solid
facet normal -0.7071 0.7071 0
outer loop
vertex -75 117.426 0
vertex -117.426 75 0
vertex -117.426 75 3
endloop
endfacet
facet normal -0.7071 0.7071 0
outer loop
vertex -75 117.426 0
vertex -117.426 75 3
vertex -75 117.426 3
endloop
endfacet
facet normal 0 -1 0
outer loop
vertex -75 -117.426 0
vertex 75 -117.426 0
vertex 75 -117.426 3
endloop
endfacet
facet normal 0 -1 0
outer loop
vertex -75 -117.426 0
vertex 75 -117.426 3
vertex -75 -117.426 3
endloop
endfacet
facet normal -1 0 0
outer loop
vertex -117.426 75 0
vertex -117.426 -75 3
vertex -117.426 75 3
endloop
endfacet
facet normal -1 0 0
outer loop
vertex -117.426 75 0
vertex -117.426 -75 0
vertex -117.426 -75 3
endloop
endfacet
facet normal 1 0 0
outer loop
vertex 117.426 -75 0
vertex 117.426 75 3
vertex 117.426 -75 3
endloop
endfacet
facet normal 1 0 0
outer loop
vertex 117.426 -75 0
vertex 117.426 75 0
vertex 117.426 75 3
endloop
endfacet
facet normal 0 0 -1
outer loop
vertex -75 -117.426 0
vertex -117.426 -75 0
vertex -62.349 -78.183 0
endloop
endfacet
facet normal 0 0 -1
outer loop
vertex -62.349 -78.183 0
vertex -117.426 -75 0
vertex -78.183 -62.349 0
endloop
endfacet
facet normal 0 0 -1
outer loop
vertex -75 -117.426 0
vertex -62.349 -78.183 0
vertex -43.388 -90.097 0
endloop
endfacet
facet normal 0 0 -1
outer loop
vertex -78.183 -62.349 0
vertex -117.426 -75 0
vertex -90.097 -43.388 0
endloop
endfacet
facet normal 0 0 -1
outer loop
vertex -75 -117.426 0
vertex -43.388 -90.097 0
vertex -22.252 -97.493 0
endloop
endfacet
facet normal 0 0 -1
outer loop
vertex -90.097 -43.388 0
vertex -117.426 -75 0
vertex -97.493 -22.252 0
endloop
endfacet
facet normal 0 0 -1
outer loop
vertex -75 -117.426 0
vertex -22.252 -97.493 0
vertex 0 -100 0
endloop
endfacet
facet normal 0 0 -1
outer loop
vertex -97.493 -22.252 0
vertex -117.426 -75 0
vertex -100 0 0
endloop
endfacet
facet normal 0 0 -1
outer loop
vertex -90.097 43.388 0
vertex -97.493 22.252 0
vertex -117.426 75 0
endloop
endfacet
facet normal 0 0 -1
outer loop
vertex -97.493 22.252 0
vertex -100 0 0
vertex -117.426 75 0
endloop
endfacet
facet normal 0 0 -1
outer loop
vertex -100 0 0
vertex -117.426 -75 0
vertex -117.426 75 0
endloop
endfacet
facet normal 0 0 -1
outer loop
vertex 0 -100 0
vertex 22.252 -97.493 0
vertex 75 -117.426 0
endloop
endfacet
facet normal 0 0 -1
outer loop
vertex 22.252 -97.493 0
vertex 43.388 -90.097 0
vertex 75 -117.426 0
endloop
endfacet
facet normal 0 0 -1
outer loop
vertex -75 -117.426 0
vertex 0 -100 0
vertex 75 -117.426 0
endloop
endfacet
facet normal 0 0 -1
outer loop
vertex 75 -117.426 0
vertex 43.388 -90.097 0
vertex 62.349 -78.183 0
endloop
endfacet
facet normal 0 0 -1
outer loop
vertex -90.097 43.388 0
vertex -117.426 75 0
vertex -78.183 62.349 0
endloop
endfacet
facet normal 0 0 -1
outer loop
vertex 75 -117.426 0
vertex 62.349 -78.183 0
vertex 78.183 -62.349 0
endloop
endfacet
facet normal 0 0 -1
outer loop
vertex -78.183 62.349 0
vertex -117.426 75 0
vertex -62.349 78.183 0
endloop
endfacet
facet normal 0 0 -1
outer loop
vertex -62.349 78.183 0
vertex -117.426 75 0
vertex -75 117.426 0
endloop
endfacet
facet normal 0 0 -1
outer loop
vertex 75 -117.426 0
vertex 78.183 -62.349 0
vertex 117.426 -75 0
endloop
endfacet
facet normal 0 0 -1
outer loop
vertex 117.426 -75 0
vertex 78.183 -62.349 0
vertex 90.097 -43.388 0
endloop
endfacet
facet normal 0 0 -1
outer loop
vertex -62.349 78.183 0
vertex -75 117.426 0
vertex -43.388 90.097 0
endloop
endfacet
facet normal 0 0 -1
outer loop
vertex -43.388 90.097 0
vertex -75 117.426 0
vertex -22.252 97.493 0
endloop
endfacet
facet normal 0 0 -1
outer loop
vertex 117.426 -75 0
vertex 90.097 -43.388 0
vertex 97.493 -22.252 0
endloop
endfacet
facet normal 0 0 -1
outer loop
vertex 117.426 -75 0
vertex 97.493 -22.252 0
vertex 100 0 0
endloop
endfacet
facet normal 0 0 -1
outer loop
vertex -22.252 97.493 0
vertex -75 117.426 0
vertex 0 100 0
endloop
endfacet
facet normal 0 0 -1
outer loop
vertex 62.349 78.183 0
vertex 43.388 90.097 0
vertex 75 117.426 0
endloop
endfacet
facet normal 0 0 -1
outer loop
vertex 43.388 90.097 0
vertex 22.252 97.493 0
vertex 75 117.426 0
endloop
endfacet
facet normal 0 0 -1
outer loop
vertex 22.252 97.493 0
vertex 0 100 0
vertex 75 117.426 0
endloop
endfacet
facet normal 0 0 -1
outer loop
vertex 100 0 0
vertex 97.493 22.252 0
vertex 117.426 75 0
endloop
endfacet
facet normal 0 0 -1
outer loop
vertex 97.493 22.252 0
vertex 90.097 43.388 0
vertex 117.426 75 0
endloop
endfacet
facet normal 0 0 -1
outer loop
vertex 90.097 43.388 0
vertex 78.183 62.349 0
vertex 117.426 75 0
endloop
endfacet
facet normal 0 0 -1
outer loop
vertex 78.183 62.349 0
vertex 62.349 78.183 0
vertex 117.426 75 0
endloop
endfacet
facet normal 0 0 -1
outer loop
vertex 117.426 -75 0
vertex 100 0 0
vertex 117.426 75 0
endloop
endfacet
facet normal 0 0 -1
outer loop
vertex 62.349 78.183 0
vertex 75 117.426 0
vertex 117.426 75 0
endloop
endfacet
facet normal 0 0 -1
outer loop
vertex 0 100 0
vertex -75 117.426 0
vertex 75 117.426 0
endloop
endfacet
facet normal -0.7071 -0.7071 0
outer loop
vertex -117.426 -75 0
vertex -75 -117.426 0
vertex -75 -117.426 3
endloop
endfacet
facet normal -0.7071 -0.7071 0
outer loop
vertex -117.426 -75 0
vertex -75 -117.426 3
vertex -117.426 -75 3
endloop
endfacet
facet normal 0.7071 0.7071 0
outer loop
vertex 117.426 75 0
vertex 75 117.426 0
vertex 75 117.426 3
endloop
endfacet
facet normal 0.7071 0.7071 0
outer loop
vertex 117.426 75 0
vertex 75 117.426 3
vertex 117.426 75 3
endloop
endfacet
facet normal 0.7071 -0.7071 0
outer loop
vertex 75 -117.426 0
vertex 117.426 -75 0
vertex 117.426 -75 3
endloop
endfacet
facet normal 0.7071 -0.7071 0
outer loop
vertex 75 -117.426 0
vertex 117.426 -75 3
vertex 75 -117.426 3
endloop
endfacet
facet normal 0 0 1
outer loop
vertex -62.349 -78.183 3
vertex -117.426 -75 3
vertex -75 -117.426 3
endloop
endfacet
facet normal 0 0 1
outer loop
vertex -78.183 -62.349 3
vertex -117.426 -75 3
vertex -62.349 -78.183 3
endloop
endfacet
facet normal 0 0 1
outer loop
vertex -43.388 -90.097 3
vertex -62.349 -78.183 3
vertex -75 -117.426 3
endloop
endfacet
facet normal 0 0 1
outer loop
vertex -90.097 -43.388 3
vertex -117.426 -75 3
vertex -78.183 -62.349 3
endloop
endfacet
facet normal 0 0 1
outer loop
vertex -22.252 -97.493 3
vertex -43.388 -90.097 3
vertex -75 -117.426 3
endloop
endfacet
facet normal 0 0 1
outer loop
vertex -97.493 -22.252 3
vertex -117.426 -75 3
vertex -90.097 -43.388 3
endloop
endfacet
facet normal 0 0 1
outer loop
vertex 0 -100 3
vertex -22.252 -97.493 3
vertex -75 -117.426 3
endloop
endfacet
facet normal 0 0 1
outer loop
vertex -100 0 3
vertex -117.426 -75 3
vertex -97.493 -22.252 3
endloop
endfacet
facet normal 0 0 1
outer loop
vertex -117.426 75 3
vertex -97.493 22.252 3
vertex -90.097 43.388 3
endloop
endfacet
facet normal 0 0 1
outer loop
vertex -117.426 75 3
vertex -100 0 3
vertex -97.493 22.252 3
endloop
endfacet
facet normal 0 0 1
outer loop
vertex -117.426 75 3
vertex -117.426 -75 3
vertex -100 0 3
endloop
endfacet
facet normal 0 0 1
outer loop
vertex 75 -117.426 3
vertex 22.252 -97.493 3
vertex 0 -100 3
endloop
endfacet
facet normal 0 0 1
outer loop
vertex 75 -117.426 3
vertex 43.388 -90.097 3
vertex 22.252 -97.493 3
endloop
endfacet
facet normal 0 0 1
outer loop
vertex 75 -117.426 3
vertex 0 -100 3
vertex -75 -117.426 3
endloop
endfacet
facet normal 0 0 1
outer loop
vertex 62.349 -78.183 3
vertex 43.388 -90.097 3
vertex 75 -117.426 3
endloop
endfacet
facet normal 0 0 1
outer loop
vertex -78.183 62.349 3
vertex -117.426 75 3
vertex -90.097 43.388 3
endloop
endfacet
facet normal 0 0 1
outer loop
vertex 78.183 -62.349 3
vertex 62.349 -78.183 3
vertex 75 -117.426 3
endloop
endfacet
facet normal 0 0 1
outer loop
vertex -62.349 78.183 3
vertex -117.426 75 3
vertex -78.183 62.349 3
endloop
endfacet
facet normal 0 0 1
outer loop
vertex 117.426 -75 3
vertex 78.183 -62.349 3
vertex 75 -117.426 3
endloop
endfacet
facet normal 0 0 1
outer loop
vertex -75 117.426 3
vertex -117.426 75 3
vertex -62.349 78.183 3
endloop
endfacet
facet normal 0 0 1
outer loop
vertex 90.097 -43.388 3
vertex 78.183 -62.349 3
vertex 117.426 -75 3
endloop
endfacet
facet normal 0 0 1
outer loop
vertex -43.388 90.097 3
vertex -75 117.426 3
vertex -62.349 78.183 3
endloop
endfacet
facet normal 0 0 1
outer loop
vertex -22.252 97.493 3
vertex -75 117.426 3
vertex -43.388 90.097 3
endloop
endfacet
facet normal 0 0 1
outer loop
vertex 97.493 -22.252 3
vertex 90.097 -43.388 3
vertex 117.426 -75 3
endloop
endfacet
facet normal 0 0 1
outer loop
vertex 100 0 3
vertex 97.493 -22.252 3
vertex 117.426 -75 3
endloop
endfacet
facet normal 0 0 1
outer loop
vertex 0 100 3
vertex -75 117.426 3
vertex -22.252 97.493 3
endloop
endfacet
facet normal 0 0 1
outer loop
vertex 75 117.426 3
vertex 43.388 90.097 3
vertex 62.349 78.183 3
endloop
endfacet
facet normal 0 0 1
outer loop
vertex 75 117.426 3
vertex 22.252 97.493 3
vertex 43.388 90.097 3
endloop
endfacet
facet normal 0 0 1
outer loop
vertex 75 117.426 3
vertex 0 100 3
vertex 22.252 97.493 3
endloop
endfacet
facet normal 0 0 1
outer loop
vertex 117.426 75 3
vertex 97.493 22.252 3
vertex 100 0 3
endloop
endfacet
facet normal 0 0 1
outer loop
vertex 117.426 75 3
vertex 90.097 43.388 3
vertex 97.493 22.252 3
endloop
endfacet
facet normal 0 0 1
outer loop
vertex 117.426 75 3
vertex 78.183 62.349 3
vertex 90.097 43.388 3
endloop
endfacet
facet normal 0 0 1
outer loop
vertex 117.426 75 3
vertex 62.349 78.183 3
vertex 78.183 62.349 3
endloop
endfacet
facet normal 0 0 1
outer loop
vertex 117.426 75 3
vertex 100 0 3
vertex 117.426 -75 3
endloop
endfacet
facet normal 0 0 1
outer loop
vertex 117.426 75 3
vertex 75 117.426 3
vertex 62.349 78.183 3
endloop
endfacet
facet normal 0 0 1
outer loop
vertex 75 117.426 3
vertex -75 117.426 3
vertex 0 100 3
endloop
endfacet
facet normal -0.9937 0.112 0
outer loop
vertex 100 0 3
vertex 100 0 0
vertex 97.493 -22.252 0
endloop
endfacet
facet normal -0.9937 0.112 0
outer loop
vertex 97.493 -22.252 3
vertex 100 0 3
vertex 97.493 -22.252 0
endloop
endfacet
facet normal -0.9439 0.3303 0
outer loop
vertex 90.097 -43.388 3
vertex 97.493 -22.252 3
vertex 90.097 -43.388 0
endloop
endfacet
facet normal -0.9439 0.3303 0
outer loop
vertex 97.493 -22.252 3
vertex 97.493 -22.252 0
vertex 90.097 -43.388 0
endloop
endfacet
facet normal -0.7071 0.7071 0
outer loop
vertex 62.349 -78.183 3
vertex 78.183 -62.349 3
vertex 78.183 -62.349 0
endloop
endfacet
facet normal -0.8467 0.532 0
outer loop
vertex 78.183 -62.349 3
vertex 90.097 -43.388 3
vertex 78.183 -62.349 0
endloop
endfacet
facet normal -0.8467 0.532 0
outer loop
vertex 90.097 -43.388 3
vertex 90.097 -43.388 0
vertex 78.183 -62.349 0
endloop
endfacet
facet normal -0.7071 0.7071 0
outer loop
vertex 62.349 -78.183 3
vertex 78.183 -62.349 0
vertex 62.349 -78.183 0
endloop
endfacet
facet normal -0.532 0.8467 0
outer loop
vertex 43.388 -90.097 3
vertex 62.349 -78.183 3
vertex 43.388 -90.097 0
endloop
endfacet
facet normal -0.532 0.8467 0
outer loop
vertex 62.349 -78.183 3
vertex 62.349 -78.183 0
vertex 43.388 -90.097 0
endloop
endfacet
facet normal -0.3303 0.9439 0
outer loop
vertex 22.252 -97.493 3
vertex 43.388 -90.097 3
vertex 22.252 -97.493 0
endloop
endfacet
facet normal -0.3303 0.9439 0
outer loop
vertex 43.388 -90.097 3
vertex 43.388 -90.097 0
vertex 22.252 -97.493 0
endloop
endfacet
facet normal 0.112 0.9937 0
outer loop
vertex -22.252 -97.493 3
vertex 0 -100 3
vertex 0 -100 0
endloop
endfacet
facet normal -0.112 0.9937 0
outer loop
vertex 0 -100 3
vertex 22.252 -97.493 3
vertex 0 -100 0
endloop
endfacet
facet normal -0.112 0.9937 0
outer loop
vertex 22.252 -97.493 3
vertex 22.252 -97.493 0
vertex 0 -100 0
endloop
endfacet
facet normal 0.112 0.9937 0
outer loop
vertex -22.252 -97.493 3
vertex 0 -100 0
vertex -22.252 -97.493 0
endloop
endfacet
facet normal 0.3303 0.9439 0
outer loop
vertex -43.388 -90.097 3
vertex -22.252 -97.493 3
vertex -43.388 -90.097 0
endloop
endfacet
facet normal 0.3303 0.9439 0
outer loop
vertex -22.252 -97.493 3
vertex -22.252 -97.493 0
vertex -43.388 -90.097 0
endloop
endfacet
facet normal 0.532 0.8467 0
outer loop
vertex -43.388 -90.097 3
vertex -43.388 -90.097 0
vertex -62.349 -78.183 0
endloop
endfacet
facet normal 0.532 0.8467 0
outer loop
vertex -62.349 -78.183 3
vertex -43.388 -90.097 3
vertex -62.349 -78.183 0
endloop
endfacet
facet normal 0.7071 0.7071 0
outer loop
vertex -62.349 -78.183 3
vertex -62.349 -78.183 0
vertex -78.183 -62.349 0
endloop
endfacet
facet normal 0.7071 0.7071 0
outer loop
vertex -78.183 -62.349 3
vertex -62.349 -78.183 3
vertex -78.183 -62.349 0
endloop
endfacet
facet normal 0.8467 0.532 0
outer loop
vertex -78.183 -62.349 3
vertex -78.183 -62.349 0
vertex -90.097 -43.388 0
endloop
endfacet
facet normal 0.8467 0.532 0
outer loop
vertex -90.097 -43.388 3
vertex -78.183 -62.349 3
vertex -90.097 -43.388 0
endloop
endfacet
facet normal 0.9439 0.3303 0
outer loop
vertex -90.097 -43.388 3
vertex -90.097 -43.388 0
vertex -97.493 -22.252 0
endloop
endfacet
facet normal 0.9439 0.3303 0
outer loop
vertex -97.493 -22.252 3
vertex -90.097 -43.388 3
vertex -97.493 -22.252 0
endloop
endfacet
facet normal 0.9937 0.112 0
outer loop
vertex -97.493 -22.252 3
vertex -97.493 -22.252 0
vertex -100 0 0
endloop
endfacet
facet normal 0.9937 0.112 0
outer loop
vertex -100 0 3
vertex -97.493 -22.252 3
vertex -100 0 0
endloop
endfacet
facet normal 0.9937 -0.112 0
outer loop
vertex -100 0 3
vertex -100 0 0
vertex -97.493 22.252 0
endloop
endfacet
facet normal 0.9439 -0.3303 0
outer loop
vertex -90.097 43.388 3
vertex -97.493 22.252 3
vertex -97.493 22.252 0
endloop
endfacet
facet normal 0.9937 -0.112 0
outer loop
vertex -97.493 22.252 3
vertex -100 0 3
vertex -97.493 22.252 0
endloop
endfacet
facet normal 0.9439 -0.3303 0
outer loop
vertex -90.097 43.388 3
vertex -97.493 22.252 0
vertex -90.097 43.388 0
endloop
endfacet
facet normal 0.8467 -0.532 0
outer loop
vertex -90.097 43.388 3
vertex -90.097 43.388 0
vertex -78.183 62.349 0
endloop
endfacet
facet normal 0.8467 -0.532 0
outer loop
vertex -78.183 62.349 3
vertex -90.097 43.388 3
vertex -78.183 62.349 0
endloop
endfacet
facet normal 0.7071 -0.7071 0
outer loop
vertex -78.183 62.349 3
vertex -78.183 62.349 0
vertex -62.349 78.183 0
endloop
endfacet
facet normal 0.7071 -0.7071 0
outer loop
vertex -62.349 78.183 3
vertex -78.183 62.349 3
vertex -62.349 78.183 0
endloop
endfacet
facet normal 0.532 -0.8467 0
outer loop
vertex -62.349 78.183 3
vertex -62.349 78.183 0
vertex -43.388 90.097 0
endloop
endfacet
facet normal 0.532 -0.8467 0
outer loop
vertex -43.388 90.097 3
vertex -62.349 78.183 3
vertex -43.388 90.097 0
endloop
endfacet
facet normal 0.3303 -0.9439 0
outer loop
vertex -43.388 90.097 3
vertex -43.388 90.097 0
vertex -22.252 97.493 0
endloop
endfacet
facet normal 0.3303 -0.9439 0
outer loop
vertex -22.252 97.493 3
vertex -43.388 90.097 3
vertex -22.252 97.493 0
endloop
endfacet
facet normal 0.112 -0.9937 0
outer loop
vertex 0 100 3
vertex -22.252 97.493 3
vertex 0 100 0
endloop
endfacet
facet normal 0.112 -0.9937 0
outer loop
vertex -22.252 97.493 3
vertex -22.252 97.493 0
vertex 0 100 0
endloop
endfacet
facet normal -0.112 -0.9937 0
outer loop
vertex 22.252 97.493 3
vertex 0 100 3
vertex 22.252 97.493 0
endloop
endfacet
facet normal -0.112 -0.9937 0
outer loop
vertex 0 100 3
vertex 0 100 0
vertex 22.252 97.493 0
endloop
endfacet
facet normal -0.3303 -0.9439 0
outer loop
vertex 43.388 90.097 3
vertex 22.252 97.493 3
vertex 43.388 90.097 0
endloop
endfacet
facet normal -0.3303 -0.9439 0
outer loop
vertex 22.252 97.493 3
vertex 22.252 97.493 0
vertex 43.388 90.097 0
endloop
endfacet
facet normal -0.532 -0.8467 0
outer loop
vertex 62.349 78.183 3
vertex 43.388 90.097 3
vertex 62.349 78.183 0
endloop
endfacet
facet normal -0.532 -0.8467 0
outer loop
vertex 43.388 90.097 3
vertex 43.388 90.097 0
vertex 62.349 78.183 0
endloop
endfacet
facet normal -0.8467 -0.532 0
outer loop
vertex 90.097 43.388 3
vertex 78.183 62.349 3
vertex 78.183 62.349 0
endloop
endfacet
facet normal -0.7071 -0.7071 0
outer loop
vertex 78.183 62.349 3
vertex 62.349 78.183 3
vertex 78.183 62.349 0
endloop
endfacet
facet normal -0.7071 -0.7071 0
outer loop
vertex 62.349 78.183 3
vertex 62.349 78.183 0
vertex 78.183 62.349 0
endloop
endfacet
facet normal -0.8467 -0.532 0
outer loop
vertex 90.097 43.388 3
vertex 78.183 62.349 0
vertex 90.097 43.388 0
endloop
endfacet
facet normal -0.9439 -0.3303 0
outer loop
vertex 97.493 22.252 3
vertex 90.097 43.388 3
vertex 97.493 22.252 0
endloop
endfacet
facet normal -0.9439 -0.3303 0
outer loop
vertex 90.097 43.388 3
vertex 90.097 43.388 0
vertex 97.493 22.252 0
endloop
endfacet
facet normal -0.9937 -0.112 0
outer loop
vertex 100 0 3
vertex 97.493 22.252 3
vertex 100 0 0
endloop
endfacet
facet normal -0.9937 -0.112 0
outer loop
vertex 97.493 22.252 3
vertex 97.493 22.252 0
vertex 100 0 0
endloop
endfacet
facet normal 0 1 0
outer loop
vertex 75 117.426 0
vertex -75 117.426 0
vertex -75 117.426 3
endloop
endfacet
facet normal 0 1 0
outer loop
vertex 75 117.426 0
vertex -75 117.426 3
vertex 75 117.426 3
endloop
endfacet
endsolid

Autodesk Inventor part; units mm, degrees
ref_plane "YZ Plane" through (0, 0, 0) normal (1, 0, 0) x (0, 1, 0)
ref_plane "XZ Plane" through (0, 0, 0) normal (0, 1, 0) x (-1, 0, 0)
ref_plane "XY Plane" through (0, 0, 0) normal (0, 0, 1) x (1, 0, 0)
sketch "Sketch1" plane through (0, 0, 0) normal (0, 0, 1) x (1, 0, 0)
  circle A0 centre (0, 0) radius 100
  line L0 (-117.4264, -75) -> (-117.4264, 75)
  line L1 (-117.4264, 75) -> (-75, 117.4264)
  line L2 (-75, 117.4264) -> (75, 117.4264)
  line L3 (75, 117.4264) -> (117.4264, 75)
  line L4 (117.4264, 75) -> (117.4264, -75)
  line L5 (117.4264, -75) -> (75, -117.4264)
  line L6 (75, -117.4264) -> (-75, -117.4264)
  line L7 (-75, -117.4264) -> (-117.4264, -75)
  point P0 (-117.4264, 0)
  point P1 (117.4264, 0)
  point P2 (0, 117.4264)
  point P3 (0, -117.4264)
  dimension "d22" = 200
  dimension "d33" = 150
  dimension "d35" = 60
extrude "Plate1" add sketch "Sketch1" along normal blind 3
equation "\"d33\" = Wall_1_width"
equation "\"d35\" = Wall_2_width"
equation "\"d2\" = Thickness"
equation "\"BendReliefWidth\" = Thickness"
equation "\"BendReliefDepth\" = 0.5 * Thickness"
equation "\"CornerReliefSize\" = 4 * Thickness"
equation "\"MinimumRemnant\" = 2 * Thickness"
equation "\"TransitionRadius\" = BendRadius"
equation "\"JacobiRadiusSize\" = BendRadius"
equation "\"GapSize\" = Thickness"
equation "\"Wall_1_width\" = 150"
equation "\"Wall_2_width\" = 60"
equation "\"Thickness\" = 3"
equation "\"BendRadius\" = 5"
properties part number "TKS 3553 BOTTOM DS reduce flange" material "Stainless Steel"
